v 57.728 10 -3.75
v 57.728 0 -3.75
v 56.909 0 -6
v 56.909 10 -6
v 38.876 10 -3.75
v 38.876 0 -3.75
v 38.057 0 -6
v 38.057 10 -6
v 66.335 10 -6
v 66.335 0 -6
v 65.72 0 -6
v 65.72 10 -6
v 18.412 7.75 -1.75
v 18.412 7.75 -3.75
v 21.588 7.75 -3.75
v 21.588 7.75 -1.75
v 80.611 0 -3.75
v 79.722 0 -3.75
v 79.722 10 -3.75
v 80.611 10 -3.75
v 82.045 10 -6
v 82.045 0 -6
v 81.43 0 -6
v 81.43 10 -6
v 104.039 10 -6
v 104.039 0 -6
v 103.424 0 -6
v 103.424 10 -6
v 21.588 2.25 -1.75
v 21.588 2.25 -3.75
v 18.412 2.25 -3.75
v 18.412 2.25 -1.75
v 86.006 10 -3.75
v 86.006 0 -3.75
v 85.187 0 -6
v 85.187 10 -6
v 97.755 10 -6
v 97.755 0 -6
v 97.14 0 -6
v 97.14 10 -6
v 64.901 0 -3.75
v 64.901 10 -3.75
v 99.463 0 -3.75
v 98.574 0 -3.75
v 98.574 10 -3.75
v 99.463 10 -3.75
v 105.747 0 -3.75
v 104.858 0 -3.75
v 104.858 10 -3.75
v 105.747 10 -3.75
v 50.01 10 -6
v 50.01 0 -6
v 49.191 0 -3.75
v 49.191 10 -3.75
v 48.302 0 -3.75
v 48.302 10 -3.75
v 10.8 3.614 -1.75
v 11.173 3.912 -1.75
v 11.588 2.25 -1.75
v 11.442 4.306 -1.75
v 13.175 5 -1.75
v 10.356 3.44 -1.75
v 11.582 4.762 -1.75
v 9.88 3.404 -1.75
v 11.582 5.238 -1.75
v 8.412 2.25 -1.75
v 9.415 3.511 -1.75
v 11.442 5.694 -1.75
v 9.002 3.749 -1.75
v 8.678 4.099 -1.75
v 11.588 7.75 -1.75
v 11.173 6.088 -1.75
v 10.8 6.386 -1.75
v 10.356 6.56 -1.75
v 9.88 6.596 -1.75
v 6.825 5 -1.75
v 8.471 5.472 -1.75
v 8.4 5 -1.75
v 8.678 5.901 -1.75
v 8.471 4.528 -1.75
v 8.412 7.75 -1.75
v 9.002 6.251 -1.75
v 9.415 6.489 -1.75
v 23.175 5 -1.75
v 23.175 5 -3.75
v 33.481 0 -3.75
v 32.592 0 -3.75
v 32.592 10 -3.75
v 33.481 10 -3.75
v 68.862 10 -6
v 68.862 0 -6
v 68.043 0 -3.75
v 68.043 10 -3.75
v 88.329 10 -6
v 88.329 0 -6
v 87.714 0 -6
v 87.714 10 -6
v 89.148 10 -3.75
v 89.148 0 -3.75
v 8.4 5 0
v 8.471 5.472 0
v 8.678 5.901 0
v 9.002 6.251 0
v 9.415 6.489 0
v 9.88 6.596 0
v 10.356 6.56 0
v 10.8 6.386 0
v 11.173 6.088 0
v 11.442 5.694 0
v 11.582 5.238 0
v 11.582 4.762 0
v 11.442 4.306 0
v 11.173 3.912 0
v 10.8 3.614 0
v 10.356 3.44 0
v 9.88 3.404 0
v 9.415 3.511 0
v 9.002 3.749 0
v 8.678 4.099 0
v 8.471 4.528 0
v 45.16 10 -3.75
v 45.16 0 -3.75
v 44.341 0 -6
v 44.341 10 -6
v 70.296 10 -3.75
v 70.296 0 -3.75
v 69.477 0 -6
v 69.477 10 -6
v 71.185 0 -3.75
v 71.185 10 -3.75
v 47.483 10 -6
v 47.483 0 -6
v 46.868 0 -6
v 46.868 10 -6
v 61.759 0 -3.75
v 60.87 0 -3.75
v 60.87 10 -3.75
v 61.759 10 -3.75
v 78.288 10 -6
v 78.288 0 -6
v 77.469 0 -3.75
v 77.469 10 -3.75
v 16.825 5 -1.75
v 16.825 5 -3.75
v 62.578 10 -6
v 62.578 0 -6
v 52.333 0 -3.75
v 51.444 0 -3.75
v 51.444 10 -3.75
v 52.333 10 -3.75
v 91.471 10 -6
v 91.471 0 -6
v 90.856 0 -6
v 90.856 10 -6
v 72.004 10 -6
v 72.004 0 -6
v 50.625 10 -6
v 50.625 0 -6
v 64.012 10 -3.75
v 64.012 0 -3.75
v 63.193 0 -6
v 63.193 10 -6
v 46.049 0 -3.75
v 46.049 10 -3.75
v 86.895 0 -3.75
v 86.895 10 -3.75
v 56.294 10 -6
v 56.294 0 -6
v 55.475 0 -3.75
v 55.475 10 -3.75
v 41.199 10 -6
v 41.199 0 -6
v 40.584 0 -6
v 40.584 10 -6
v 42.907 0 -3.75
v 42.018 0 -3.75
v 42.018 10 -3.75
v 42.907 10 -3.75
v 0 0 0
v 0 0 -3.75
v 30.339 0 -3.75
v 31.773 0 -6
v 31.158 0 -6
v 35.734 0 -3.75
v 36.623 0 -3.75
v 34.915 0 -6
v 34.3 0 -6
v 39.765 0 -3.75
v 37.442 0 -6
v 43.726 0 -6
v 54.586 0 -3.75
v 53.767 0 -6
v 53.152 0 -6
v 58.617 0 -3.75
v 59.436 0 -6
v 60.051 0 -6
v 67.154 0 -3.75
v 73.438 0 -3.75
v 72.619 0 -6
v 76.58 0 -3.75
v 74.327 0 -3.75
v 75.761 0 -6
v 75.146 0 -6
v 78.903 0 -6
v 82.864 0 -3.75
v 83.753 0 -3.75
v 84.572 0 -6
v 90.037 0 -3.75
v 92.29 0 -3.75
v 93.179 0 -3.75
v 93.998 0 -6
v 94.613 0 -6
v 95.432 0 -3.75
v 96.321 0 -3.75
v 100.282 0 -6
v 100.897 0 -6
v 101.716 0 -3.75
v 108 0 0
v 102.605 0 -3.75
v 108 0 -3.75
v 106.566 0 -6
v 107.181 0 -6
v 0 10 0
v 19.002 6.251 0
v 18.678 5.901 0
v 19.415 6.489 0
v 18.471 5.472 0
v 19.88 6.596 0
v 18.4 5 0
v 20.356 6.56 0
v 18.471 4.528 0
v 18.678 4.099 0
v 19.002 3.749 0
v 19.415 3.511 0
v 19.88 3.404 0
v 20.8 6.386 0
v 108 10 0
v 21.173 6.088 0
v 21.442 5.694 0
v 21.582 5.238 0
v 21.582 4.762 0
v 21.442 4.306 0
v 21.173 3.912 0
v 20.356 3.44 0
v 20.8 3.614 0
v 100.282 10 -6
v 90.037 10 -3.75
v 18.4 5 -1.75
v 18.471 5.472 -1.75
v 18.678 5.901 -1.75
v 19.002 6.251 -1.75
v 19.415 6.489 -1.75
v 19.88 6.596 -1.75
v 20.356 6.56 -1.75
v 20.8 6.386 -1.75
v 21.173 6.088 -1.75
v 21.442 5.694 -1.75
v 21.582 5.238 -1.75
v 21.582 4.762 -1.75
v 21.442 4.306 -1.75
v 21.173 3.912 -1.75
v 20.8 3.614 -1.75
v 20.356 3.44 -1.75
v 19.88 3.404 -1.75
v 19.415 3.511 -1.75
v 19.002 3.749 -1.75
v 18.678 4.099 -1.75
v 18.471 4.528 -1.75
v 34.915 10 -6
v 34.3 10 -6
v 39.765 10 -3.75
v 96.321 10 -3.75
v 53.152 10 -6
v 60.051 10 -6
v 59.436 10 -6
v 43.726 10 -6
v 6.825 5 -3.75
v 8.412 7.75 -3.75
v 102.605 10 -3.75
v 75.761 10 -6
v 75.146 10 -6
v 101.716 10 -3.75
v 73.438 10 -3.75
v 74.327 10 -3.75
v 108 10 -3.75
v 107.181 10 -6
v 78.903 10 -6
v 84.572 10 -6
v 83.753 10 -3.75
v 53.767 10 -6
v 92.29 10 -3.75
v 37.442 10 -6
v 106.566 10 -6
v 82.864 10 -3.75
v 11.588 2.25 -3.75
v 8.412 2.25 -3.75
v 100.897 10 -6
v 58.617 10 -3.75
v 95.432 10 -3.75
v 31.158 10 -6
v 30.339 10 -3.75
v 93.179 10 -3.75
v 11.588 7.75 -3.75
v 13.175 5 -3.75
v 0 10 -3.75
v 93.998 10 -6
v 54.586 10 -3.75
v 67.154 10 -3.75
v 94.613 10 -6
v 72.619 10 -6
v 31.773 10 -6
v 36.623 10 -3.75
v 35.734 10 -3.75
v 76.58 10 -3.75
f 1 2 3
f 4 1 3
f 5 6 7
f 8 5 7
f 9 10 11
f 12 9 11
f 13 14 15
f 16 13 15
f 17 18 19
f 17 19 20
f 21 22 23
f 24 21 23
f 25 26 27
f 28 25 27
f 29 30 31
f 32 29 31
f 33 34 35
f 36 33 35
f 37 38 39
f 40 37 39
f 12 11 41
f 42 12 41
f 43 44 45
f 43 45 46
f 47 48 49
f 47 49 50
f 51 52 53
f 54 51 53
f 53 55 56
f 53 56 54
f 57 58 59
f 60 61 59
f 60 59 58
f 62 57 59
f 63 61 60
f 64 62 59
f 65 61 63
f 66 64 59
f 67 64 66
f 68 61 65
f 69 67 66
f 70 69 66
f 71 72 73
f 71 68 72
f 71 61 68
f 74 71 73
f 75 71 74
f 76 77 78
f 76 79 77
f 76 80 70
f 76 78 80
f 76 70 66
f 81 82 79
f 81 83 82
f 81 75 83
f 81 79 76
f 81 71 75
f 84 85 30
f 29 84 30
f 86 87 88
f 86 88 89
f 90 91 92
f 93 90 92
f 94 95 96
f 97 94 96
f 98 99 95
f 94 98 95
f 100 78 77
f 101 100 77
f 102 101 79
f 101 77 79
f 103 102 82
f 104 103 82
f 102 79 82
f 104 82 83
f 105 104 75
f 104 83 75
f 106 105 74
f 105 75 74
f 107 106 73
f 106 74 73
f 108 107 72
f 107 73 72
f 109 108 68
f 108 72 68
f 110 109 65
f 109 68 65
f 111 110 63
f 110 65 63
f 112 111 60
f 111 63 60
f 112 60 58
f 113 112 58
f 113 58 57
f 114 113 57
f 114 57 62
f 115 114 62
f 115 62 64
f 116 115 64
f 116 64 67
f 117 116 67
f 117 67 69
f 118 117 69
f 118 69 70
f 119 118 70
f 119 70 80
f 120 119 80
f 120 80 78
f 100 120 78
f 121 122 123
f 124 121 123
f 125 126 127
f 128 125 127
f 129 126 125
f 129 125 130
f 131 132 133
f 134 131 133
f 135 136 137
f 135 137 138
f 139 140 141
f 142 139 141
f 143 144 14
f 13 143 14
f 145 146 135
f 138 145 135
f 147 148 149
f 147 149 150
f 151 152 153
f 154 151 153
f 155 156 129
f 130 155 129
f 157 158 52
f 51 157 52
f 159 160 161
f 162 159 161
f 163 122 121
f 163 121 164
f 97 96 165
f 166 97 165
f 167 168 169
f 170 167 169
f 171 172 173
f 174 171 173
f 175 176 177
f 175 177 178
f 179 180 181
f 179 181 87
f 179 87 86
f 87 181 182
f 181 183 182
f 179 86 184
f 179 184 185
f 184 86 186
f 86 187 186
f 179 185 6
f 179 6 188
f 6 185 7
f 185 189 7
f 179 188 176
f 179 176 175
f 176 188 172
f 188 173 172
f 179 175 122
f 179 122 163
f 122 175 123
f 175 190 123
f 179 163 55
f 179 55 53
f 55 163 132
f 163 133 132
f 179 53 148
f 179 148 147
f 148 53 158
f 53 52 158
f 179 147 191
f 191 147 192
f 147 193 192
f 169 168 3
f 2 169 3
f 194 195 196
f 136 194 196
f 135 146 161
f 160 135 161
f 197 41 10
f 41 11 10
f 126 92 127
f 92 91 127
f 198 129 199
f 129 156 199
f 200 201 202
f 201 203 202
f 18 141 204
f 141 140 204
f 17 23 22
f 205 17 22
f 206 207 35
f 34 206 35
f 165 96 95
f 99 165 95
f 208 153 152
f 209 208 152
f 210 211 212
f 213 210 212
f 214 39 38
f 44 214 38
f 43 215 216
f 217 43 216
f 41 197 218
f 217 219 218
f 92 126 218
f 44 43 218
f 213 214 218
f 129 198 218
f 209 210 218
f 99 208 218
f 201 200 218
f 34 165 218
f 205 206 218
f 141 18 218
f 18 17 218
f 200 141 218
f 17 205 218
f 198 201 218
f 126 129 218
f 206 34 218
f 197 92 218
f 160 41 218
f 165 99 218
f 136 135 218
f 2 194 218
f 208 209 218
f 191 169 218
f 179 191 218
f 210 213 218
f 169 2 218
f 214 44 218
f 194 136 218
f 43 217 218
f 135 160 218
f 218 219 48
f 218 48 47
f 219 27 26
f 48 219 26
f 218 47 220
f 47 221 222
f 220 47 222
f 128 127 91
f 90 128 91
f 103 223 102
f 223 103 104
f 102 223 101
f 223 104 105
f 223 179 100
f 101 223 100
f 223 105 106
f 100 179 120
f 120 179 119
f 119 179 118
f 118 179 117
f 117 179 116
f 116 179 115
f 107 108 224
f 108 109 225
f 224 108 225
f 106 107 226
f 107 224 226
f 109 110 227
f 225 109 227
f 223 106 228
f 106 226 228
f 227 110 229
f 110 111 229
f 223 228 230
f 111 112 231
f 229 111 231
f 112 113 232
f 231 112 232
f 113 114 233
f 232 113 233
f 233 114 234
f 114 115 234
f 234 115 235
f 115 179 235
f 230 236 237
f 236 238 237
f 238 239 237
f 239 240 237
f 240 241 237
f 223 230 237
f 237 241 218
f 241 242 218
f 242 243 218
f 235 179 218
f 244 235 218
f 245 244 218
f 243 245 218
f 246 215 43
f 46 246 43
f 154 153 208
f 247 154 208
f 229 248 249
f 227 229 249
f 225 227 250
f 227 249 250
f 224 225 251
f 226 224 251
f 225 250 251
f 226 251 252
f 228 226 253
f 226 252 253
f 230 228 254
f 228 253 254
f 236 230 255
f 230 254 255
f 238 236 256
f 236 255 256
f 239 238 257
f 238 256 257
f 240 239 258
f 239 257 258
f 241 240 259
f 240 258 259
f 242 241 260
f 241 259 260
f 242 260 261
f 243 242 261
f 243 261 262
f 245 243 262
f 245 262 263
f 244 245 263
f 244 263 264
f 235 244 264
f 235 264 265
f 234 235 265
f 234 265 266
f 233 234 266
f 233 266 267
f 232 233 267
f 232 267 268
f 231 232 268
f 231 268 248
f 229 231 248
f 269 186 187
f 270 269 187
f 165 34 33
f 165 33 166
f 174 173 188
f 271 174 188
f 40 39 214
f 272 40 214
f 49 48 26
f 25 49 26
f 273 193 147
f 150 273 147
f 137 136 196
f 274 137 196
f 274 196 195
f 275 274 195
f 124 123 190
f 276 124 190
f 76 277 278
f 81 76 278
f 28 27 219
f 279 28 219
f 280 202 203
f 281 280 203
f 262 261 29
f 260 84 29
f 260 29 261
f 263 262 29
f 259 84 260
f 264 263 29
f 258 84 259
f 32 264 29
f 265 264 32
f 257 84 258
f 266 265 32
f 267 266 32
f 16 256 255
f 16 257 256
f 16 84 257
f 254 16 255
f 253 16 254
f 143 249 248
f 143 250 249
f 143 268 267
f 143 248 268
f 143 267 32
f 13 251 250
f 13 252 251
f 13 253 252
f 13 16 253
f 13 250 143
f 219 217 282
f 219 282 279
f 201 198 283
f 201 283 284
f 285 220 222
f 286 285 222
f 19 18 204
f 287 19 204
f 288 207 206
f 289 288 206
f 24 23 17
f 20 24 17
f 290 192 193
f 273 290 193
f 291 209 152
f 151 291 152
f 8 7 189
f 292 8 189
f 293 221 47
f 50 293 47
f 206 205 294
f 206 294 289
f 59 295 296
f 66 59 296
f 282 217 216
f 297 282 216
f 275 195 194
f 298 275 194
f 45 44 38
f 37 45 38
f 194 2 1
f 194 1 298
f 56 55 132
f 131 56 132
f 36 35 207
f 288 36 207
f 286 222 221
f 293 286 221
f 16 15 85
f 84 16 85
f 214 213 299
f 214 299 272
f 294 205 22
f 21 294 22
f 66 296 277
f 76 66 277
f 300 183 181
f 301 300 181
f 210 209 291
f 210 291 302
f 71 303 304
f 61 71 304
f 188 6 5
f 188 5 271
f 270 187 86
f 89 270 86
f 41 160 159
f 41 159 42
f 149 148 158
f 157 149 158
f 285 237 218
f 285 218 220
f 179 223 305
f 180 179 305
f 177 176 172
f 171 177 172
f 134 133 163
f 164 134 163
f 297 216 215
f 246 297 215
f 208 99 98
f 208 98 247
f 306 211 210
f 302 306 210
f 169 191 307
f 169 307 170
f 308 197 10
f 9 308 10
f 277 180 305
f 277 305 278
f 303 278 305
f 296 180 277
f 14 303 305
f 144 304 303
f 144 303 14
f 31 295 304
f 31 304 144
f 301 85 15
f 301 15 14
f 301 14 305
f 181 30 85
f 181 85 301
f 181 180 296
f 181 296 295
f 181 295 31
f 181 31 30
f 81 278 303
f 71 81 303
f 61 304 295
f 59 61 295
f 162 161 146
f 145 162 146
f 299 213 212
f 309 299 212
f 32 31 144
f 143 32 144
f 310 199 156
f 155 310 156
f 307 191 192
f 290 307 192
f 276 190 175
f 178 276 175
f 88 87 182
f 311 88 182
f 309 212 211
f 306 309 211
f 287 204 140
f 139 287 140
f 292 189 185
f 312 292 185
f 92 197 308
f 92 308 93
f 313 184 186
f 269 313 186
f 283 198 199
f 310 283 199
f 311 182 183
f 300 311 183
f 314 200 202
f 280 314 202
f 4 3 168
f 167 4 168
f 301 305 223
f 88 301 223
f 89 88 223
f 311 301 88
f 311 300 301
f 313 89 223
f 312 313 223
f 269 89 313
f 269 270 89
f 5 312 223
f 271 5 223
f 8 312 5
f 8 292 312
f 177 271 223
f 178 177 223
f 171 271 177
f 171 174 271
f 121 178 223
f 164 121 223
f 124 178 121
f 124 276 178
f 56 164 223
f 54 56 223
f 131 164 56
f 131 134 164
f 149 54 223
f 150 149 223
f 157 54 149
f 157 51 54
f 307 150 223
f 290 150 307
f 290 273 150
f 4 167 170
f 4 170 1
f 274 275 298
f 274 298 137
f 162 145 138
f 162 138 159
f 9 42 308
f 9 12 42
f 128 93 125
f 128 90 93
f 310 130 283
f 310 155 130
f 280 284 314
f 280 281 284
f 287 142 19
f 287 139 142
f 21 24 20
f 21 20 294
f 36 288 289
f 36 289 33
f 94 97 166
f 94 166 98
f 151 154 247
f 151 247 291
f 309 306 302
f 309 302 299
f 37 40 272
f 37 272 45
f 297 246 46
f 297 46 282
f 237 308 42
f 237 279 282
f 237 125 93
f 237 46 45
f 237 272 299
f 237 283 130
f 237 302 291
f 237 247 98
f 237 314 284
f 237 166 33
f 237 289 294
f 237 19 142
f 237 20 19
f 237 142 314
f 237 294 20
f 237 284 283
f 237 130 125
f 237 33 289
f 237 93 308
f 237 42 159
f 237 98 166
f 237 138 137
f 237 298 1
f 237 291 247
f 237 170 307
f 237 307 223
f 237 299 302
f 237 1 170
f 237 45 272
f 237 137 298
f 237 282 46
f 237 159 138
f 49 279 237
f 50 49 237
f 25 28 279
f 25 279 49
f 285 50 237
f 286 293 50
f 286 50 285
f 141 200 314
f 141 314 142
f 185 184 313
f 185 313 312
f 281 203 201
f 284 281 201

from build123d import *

# Parameters (mm, degrees)
EXTRUDE_1_DEPTH        = 10
EXTRUDE_2_DEPTH        = 10
PATTERN_LINEAR_1_COUNT = 25
PATTERN_LINEAR_1_PITCH = 3.142
SKETCH_2_R             = 1.6
CUT_EXTRUDE_1_DEPTH    = 10
CUT_EXTRUDE_2_DEPTH    = 2


with BuildPart() as part:
    # 草图1 → 凸台-拉伸1 (new body)
    with BuildSketch(Plane(origin=(0, 0, 0), x_dir=(1, 0, 0), z_dir=(0, 1, 0))):
        Polygon((0, 3.75), (0, 0), (108, 0), (108, 3.75), (105.747407554, 3.75), align=None)
    extrude(amount=EXTRUDE_1_DEPTH)

    # 草图1<5> → 凸台-拉伸2 (add)
    with BuildSketch(Plane(origin=(0, 0, 0), x_dir=(1, 0, 0), z_dir=(0, 1, 0))):
        Polygon((105.747407554, 3.75), (108, 3.75), (107.181203777, 5.999624134), (106.566203777, 5.999624134), align=None)
    extrude_2 = extrude(amount=EXTRUDE_2_DEPTH)

    # 阵列(线性)1: 凸台-拉伸2 ×25
    with Locations(*[(-i * PATTERN_LINEAR_1_PITCH, 0, 0) for i in range(1, PATTERN_LINEAR_1_COUNT)]):
        add(extrude_2)

    # 草图2 → 切除-拉伸1 (cut)
    with BuildSketch(Plane(origin=(0, 0, -3.75), x_dir=(-1, 0, 0), z_dir=(0, 0, -1))):
        with Locations((-10, 5)):
            Circle(SKETCH_2_R)
        with Locations((-20, 5)):
            Circle(SKETCH_2_R)
    extrude(amount=-CUT_EXTRUDE_1_DEPTH, mode=Mode.SUBTRACT)

    # 草图3 → 切除-拉伸2 (cut)
    with BuildSketch(Plane(origin=(0, 0, -3.75), x_dir=(-1, 0, 0), z_dir=(0, 0, -1))):
        Polygon((-21.58771324, 7.75), (-23.175426481, 5), (-21.58771324, 2.25), (-18.41228676, 2.25), (-16.824573519, 5), (-18.41228676, 7.75), align=None)
        Polygon((-11.58771324, 7.75), (-13.175426481, 5), (-11.58771324, 2.25), (-8.41228676, 2.25), (-6.824573519, 5), (-8.41228676, 7.75), align=None)
    extrude(amount=-CUT_EXTRUDE_2_DEPTH, mode=Mode.SUBTRACT)


solid = part.part
